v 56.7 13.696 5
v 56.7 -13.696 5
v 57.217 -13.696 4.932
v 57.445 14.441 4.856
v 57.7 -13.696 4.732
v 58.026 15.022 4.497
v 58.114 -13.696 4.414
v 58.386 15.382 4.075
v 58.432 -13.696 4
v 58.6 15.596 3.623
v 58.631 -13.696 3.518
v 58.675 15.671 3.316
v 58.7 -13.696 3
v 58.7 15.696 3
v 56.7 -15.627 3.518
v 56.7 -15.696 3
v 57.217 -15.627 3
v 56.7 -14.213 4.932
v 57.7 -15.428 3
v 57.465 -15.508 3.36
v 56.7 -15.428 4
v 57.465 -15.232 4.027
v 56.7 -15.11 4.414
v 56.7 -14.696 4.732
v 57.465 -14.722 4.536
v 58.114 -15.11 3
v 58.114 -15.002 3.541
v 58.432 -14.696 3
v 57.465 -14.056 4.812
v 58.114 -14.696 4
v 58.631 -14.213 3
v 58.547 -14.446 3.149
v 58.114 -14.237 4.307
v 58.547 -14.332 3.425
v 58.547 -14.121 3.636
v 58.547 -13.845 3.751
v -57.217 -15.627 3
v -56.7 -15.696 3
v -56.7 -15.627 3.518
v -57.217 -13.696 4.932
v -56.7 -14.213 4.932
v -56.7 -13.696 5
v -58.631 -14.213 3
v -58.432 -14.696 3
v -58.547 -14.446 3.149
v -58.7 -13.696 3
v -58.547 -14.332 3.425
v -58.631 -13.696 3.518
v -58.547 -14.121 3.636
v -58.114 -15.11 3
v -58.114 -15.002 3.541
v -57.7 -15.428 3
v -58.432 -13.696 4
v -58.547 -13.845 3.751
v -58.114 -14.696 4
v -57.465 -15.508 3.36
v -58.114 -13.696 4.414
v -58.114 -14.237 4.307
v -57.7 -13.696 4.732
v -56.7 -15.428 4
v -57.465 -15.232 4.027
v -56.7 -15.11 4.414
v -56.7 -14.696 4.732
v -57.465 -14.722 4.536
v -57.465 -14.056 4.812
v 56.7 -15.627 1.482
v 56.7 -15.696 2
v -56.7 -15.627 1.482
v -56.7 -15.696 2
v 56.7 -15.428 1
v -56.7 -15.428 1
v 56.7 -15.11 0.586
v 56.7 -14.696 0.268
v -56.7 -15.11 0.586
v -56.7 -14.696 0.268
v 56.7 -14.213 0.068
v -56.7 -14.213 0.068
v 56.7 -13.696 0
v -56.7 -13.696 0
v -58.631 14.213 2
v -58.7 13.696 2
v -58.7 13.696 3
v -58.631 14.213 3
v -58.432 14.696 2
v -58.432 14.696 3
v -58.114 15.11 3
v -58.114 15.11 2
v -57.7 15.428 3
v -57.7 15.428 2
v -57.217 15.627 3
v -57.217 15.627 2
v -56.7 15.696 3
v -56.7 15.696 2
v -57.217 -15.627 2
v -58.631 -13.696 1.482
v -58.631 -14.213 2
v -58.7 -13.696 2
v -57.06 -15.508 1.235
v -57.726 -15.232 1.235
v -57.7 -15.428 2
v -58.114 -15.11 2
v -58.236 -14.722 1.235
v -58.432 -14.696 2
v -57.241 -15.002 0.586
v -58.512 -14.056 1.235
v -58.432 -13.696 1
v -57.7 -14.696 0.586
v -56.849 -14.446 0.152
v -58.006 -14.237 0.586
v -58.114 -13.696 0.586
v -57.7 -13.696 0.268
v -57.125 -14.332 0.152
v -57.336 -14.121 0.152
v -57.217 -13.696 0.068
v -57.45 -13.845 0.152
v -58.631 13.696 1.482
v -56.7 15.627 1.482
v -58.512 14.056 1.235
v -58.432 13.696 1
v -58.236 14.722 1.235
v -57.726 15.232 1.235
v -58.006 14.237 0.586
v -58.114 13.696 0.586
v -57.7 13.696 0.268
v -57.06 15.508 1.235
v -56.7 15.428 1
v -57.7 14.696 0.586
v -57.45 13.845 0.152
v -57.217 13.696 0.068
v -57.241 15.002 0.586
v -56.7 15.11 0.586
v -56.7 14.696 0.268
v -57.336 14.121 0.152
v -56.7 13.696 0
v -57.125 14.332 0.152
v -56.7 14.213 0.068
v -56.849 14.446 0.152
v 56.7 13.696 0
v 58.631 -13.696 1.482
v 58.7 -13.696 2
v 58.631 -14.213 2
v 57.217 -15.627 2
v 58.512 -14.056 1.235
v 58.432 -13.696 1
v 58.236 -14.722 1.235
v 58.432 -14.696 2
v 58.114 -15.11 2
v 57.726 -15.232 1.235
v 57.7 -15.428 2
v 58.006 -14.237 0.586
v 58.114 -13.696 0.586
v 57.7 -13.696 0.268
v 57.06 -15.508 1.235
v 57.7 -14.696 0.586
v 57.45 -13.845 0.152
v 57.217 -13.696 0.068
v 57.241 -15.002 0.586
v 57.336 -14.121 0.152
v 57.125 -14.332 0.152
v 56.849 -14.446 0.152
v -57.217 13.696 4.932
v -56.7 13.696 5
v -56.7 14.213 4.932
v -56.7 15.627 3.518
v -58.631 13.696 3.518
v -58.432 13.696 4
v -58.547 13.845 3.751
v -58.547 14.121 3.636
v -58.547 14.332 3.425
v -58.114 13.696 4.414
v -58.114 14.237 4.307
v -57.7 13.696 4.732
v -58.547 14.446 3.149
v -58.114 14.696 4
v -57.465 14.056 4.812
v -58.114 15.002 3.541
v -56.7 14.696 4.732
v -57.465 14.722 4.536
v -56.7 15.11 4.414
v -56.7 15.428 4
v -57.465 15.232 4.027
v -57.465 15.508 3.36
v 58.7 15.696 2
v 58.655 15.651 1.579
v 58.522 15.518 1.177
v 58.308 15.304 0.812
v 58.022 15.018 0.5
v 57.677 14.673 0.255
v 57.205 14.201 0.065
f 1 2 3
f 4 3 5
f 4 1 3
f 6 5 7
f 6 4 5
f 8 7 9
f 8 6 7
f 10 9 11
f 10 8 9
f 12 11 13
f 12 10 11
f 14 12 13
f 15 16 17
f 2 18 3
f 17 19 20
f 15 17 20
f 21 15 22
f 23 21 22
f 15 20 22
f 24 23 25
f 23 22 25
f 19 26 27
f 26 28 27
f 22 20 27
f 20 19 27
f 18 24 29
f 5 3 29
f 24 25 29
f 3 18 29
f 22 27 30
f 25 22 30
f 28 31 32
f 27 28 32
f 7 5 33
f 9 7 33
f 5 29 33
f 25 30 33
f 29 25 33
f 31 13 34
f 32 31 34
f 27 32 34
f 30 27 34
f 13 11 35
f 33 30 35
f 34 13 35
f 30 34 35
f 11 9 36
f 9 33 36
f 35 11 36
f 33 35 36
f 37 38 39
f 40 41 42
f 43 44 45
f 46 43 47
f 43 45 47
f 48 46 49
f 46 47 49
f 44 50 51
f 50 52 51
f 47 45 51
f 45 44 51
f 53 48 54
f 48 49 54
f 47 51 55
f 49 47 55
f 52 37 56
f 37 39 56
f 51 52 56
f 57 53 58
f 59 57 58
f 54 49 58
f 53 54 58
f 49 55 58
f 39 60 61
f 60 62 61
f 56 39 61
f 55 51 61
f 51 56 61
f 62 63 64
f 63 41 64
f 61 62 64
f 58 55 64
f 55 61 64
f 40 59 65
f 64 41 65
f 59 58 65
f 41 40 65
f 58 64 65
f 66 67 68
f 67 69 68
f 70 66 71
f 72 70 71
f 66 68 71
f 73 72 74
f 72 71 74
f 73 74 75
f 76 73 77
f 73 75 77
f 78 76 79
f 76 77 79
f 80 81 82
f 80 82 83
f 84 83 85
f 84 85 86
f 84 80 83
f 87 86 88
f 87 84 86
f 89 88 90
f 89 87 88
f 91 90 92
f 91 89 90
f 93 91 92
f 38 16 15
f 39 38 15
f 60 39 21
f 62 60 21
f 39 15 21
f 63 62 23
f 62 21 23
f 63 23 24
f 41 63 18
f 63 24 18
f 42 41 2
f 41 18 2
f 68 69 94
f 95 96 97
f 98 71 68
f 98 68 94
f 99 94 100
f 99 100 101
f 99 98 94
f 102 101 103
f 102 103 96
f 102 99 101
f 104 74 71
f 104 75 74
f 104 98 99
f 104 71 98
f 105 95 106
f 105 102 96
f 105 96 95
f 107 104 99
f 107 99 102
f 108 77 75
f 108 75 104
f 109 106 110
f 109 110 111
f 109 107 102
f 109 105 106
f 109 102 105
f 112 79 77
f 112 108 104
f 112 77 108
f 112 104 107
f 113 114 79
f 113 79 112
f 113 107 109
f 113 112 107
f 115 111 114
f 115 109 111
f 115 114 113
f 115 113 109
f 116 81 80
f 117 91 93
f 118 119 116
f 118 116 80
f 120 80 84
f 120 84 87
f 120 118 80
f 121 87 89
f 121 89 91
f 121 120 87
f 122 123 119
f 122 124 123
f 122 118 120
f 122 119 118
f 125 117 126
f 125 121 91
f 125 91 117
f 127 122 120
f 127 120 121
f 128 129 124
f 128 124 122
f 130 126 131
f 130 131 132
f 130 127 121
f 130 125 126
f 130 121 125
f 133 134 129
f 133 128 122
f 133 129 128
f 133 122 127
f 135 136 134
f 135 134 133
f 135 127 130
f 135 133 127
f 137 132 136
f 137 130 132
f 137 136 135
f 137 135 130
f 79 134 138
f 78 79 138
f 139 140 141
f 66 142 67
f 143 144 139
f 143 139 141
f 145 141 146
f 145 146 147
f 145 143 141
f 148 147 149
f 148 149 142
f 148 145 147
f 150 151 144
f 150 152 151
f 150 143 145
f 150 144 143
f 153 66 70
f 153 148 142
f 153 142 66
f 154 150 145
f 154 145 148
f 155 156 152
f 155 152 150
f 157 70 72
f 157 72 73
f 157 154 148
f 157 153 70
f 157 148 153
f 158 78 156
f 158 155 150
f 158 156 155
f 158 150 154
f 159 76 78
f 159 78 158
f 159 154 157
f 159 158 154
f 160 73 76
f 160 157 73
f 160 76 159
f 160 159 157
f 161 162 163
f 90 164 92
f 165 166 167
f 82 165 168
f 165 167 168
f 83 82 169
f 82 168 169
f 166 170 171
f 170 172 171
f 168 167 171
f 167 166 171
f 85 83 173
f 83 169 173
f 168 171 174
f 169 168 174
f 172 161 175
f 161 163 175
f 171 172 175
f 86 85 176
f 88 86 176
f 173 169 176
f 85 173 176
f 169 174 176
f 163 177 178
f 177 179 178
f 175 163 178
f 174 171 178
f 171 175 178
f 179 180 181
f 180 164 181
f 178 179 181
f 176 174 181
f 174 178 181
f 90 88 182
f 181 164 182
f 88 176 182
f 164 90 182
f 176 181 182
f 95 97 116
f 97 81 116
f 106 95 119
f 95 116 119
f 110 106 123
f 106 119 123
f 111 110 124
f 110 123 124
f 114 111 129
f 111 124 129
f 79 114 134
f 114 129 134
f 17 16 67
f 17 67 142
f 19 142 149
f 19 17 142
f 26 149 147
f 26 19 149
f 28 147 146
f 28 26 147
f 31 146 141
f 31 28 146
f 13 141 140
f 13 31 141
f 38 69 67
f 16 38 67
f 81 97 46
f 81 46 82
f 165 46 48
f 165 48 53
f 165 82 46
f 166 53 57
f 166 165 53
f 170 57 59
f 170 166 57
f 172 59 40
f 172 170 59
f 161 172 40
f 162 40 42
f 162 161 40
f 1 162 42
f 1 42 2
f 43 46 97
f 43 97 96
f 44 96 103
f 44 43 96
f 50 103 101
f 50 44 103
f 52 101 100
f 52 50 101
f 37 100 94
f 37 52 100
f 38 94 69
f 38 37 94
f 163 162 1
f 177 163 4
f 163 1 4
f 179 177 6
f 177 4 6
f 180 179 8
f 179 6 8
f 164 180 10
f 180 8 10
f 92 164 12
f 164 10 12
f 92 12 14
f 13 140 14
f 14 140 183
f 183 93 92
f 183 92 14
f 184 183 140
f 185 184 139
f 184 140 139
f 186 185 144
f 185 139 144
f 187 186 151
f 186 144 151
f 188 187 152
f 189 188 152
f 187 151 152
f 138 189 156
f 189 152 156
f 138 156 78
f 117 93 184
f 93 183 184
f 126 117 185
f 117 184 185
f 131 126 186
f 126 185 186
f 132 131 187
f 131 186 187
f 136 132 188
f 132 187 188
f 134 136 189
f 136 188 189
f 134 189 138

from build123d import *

# Parameters (mm, degrees)
F0_W     = 117.3992
F0_H     = 31.391128
F1_DEPTH = 5
F2_R     = 2
F3_R     = 2
F4_R     = 2
F5_R     = 2


with BuildPart() as f1:
    # F0 (on Top) → F1 (new body)
    with BuildSketch(Plane.XY):
        Rectangle(F0_W, F0_H)
    extrude(amount=F1_DEPTH)

    # F2
    f2_edges = [f1.edges().sort_by_distance(p)[0] for p in [
        (0, -15.695564, 5),
    ]]
    fillet(f2_edges, radius=F2_R)

    # F3
    f3_edges = [f1.edges().sort_by_distance(p)[0] for p in [
        (58.6996, 1, 5),
        (0, 15.695564, 5),
    ]]
    fillet(f3_edges, radius=F3_R)

    # F4
    f4_edges = [f1.edges().sort_by_distance(p)[0] for p in [
        (-58.6996, 0, 5),
    ]]
    fillet(f4_edges, radius=F4_R)

    # F5
    f5_edges = [f1.edges().sort_by_distance(p)[0] for p in [
        (-58.6996, 0, 0),
        (0, -15.695564, 0),
        (1, 15.695564, 0),
        (58.6996, 1, 0),
    ]]
    fillet(f5_edges, radius=F5_R)


solid = f1.part
